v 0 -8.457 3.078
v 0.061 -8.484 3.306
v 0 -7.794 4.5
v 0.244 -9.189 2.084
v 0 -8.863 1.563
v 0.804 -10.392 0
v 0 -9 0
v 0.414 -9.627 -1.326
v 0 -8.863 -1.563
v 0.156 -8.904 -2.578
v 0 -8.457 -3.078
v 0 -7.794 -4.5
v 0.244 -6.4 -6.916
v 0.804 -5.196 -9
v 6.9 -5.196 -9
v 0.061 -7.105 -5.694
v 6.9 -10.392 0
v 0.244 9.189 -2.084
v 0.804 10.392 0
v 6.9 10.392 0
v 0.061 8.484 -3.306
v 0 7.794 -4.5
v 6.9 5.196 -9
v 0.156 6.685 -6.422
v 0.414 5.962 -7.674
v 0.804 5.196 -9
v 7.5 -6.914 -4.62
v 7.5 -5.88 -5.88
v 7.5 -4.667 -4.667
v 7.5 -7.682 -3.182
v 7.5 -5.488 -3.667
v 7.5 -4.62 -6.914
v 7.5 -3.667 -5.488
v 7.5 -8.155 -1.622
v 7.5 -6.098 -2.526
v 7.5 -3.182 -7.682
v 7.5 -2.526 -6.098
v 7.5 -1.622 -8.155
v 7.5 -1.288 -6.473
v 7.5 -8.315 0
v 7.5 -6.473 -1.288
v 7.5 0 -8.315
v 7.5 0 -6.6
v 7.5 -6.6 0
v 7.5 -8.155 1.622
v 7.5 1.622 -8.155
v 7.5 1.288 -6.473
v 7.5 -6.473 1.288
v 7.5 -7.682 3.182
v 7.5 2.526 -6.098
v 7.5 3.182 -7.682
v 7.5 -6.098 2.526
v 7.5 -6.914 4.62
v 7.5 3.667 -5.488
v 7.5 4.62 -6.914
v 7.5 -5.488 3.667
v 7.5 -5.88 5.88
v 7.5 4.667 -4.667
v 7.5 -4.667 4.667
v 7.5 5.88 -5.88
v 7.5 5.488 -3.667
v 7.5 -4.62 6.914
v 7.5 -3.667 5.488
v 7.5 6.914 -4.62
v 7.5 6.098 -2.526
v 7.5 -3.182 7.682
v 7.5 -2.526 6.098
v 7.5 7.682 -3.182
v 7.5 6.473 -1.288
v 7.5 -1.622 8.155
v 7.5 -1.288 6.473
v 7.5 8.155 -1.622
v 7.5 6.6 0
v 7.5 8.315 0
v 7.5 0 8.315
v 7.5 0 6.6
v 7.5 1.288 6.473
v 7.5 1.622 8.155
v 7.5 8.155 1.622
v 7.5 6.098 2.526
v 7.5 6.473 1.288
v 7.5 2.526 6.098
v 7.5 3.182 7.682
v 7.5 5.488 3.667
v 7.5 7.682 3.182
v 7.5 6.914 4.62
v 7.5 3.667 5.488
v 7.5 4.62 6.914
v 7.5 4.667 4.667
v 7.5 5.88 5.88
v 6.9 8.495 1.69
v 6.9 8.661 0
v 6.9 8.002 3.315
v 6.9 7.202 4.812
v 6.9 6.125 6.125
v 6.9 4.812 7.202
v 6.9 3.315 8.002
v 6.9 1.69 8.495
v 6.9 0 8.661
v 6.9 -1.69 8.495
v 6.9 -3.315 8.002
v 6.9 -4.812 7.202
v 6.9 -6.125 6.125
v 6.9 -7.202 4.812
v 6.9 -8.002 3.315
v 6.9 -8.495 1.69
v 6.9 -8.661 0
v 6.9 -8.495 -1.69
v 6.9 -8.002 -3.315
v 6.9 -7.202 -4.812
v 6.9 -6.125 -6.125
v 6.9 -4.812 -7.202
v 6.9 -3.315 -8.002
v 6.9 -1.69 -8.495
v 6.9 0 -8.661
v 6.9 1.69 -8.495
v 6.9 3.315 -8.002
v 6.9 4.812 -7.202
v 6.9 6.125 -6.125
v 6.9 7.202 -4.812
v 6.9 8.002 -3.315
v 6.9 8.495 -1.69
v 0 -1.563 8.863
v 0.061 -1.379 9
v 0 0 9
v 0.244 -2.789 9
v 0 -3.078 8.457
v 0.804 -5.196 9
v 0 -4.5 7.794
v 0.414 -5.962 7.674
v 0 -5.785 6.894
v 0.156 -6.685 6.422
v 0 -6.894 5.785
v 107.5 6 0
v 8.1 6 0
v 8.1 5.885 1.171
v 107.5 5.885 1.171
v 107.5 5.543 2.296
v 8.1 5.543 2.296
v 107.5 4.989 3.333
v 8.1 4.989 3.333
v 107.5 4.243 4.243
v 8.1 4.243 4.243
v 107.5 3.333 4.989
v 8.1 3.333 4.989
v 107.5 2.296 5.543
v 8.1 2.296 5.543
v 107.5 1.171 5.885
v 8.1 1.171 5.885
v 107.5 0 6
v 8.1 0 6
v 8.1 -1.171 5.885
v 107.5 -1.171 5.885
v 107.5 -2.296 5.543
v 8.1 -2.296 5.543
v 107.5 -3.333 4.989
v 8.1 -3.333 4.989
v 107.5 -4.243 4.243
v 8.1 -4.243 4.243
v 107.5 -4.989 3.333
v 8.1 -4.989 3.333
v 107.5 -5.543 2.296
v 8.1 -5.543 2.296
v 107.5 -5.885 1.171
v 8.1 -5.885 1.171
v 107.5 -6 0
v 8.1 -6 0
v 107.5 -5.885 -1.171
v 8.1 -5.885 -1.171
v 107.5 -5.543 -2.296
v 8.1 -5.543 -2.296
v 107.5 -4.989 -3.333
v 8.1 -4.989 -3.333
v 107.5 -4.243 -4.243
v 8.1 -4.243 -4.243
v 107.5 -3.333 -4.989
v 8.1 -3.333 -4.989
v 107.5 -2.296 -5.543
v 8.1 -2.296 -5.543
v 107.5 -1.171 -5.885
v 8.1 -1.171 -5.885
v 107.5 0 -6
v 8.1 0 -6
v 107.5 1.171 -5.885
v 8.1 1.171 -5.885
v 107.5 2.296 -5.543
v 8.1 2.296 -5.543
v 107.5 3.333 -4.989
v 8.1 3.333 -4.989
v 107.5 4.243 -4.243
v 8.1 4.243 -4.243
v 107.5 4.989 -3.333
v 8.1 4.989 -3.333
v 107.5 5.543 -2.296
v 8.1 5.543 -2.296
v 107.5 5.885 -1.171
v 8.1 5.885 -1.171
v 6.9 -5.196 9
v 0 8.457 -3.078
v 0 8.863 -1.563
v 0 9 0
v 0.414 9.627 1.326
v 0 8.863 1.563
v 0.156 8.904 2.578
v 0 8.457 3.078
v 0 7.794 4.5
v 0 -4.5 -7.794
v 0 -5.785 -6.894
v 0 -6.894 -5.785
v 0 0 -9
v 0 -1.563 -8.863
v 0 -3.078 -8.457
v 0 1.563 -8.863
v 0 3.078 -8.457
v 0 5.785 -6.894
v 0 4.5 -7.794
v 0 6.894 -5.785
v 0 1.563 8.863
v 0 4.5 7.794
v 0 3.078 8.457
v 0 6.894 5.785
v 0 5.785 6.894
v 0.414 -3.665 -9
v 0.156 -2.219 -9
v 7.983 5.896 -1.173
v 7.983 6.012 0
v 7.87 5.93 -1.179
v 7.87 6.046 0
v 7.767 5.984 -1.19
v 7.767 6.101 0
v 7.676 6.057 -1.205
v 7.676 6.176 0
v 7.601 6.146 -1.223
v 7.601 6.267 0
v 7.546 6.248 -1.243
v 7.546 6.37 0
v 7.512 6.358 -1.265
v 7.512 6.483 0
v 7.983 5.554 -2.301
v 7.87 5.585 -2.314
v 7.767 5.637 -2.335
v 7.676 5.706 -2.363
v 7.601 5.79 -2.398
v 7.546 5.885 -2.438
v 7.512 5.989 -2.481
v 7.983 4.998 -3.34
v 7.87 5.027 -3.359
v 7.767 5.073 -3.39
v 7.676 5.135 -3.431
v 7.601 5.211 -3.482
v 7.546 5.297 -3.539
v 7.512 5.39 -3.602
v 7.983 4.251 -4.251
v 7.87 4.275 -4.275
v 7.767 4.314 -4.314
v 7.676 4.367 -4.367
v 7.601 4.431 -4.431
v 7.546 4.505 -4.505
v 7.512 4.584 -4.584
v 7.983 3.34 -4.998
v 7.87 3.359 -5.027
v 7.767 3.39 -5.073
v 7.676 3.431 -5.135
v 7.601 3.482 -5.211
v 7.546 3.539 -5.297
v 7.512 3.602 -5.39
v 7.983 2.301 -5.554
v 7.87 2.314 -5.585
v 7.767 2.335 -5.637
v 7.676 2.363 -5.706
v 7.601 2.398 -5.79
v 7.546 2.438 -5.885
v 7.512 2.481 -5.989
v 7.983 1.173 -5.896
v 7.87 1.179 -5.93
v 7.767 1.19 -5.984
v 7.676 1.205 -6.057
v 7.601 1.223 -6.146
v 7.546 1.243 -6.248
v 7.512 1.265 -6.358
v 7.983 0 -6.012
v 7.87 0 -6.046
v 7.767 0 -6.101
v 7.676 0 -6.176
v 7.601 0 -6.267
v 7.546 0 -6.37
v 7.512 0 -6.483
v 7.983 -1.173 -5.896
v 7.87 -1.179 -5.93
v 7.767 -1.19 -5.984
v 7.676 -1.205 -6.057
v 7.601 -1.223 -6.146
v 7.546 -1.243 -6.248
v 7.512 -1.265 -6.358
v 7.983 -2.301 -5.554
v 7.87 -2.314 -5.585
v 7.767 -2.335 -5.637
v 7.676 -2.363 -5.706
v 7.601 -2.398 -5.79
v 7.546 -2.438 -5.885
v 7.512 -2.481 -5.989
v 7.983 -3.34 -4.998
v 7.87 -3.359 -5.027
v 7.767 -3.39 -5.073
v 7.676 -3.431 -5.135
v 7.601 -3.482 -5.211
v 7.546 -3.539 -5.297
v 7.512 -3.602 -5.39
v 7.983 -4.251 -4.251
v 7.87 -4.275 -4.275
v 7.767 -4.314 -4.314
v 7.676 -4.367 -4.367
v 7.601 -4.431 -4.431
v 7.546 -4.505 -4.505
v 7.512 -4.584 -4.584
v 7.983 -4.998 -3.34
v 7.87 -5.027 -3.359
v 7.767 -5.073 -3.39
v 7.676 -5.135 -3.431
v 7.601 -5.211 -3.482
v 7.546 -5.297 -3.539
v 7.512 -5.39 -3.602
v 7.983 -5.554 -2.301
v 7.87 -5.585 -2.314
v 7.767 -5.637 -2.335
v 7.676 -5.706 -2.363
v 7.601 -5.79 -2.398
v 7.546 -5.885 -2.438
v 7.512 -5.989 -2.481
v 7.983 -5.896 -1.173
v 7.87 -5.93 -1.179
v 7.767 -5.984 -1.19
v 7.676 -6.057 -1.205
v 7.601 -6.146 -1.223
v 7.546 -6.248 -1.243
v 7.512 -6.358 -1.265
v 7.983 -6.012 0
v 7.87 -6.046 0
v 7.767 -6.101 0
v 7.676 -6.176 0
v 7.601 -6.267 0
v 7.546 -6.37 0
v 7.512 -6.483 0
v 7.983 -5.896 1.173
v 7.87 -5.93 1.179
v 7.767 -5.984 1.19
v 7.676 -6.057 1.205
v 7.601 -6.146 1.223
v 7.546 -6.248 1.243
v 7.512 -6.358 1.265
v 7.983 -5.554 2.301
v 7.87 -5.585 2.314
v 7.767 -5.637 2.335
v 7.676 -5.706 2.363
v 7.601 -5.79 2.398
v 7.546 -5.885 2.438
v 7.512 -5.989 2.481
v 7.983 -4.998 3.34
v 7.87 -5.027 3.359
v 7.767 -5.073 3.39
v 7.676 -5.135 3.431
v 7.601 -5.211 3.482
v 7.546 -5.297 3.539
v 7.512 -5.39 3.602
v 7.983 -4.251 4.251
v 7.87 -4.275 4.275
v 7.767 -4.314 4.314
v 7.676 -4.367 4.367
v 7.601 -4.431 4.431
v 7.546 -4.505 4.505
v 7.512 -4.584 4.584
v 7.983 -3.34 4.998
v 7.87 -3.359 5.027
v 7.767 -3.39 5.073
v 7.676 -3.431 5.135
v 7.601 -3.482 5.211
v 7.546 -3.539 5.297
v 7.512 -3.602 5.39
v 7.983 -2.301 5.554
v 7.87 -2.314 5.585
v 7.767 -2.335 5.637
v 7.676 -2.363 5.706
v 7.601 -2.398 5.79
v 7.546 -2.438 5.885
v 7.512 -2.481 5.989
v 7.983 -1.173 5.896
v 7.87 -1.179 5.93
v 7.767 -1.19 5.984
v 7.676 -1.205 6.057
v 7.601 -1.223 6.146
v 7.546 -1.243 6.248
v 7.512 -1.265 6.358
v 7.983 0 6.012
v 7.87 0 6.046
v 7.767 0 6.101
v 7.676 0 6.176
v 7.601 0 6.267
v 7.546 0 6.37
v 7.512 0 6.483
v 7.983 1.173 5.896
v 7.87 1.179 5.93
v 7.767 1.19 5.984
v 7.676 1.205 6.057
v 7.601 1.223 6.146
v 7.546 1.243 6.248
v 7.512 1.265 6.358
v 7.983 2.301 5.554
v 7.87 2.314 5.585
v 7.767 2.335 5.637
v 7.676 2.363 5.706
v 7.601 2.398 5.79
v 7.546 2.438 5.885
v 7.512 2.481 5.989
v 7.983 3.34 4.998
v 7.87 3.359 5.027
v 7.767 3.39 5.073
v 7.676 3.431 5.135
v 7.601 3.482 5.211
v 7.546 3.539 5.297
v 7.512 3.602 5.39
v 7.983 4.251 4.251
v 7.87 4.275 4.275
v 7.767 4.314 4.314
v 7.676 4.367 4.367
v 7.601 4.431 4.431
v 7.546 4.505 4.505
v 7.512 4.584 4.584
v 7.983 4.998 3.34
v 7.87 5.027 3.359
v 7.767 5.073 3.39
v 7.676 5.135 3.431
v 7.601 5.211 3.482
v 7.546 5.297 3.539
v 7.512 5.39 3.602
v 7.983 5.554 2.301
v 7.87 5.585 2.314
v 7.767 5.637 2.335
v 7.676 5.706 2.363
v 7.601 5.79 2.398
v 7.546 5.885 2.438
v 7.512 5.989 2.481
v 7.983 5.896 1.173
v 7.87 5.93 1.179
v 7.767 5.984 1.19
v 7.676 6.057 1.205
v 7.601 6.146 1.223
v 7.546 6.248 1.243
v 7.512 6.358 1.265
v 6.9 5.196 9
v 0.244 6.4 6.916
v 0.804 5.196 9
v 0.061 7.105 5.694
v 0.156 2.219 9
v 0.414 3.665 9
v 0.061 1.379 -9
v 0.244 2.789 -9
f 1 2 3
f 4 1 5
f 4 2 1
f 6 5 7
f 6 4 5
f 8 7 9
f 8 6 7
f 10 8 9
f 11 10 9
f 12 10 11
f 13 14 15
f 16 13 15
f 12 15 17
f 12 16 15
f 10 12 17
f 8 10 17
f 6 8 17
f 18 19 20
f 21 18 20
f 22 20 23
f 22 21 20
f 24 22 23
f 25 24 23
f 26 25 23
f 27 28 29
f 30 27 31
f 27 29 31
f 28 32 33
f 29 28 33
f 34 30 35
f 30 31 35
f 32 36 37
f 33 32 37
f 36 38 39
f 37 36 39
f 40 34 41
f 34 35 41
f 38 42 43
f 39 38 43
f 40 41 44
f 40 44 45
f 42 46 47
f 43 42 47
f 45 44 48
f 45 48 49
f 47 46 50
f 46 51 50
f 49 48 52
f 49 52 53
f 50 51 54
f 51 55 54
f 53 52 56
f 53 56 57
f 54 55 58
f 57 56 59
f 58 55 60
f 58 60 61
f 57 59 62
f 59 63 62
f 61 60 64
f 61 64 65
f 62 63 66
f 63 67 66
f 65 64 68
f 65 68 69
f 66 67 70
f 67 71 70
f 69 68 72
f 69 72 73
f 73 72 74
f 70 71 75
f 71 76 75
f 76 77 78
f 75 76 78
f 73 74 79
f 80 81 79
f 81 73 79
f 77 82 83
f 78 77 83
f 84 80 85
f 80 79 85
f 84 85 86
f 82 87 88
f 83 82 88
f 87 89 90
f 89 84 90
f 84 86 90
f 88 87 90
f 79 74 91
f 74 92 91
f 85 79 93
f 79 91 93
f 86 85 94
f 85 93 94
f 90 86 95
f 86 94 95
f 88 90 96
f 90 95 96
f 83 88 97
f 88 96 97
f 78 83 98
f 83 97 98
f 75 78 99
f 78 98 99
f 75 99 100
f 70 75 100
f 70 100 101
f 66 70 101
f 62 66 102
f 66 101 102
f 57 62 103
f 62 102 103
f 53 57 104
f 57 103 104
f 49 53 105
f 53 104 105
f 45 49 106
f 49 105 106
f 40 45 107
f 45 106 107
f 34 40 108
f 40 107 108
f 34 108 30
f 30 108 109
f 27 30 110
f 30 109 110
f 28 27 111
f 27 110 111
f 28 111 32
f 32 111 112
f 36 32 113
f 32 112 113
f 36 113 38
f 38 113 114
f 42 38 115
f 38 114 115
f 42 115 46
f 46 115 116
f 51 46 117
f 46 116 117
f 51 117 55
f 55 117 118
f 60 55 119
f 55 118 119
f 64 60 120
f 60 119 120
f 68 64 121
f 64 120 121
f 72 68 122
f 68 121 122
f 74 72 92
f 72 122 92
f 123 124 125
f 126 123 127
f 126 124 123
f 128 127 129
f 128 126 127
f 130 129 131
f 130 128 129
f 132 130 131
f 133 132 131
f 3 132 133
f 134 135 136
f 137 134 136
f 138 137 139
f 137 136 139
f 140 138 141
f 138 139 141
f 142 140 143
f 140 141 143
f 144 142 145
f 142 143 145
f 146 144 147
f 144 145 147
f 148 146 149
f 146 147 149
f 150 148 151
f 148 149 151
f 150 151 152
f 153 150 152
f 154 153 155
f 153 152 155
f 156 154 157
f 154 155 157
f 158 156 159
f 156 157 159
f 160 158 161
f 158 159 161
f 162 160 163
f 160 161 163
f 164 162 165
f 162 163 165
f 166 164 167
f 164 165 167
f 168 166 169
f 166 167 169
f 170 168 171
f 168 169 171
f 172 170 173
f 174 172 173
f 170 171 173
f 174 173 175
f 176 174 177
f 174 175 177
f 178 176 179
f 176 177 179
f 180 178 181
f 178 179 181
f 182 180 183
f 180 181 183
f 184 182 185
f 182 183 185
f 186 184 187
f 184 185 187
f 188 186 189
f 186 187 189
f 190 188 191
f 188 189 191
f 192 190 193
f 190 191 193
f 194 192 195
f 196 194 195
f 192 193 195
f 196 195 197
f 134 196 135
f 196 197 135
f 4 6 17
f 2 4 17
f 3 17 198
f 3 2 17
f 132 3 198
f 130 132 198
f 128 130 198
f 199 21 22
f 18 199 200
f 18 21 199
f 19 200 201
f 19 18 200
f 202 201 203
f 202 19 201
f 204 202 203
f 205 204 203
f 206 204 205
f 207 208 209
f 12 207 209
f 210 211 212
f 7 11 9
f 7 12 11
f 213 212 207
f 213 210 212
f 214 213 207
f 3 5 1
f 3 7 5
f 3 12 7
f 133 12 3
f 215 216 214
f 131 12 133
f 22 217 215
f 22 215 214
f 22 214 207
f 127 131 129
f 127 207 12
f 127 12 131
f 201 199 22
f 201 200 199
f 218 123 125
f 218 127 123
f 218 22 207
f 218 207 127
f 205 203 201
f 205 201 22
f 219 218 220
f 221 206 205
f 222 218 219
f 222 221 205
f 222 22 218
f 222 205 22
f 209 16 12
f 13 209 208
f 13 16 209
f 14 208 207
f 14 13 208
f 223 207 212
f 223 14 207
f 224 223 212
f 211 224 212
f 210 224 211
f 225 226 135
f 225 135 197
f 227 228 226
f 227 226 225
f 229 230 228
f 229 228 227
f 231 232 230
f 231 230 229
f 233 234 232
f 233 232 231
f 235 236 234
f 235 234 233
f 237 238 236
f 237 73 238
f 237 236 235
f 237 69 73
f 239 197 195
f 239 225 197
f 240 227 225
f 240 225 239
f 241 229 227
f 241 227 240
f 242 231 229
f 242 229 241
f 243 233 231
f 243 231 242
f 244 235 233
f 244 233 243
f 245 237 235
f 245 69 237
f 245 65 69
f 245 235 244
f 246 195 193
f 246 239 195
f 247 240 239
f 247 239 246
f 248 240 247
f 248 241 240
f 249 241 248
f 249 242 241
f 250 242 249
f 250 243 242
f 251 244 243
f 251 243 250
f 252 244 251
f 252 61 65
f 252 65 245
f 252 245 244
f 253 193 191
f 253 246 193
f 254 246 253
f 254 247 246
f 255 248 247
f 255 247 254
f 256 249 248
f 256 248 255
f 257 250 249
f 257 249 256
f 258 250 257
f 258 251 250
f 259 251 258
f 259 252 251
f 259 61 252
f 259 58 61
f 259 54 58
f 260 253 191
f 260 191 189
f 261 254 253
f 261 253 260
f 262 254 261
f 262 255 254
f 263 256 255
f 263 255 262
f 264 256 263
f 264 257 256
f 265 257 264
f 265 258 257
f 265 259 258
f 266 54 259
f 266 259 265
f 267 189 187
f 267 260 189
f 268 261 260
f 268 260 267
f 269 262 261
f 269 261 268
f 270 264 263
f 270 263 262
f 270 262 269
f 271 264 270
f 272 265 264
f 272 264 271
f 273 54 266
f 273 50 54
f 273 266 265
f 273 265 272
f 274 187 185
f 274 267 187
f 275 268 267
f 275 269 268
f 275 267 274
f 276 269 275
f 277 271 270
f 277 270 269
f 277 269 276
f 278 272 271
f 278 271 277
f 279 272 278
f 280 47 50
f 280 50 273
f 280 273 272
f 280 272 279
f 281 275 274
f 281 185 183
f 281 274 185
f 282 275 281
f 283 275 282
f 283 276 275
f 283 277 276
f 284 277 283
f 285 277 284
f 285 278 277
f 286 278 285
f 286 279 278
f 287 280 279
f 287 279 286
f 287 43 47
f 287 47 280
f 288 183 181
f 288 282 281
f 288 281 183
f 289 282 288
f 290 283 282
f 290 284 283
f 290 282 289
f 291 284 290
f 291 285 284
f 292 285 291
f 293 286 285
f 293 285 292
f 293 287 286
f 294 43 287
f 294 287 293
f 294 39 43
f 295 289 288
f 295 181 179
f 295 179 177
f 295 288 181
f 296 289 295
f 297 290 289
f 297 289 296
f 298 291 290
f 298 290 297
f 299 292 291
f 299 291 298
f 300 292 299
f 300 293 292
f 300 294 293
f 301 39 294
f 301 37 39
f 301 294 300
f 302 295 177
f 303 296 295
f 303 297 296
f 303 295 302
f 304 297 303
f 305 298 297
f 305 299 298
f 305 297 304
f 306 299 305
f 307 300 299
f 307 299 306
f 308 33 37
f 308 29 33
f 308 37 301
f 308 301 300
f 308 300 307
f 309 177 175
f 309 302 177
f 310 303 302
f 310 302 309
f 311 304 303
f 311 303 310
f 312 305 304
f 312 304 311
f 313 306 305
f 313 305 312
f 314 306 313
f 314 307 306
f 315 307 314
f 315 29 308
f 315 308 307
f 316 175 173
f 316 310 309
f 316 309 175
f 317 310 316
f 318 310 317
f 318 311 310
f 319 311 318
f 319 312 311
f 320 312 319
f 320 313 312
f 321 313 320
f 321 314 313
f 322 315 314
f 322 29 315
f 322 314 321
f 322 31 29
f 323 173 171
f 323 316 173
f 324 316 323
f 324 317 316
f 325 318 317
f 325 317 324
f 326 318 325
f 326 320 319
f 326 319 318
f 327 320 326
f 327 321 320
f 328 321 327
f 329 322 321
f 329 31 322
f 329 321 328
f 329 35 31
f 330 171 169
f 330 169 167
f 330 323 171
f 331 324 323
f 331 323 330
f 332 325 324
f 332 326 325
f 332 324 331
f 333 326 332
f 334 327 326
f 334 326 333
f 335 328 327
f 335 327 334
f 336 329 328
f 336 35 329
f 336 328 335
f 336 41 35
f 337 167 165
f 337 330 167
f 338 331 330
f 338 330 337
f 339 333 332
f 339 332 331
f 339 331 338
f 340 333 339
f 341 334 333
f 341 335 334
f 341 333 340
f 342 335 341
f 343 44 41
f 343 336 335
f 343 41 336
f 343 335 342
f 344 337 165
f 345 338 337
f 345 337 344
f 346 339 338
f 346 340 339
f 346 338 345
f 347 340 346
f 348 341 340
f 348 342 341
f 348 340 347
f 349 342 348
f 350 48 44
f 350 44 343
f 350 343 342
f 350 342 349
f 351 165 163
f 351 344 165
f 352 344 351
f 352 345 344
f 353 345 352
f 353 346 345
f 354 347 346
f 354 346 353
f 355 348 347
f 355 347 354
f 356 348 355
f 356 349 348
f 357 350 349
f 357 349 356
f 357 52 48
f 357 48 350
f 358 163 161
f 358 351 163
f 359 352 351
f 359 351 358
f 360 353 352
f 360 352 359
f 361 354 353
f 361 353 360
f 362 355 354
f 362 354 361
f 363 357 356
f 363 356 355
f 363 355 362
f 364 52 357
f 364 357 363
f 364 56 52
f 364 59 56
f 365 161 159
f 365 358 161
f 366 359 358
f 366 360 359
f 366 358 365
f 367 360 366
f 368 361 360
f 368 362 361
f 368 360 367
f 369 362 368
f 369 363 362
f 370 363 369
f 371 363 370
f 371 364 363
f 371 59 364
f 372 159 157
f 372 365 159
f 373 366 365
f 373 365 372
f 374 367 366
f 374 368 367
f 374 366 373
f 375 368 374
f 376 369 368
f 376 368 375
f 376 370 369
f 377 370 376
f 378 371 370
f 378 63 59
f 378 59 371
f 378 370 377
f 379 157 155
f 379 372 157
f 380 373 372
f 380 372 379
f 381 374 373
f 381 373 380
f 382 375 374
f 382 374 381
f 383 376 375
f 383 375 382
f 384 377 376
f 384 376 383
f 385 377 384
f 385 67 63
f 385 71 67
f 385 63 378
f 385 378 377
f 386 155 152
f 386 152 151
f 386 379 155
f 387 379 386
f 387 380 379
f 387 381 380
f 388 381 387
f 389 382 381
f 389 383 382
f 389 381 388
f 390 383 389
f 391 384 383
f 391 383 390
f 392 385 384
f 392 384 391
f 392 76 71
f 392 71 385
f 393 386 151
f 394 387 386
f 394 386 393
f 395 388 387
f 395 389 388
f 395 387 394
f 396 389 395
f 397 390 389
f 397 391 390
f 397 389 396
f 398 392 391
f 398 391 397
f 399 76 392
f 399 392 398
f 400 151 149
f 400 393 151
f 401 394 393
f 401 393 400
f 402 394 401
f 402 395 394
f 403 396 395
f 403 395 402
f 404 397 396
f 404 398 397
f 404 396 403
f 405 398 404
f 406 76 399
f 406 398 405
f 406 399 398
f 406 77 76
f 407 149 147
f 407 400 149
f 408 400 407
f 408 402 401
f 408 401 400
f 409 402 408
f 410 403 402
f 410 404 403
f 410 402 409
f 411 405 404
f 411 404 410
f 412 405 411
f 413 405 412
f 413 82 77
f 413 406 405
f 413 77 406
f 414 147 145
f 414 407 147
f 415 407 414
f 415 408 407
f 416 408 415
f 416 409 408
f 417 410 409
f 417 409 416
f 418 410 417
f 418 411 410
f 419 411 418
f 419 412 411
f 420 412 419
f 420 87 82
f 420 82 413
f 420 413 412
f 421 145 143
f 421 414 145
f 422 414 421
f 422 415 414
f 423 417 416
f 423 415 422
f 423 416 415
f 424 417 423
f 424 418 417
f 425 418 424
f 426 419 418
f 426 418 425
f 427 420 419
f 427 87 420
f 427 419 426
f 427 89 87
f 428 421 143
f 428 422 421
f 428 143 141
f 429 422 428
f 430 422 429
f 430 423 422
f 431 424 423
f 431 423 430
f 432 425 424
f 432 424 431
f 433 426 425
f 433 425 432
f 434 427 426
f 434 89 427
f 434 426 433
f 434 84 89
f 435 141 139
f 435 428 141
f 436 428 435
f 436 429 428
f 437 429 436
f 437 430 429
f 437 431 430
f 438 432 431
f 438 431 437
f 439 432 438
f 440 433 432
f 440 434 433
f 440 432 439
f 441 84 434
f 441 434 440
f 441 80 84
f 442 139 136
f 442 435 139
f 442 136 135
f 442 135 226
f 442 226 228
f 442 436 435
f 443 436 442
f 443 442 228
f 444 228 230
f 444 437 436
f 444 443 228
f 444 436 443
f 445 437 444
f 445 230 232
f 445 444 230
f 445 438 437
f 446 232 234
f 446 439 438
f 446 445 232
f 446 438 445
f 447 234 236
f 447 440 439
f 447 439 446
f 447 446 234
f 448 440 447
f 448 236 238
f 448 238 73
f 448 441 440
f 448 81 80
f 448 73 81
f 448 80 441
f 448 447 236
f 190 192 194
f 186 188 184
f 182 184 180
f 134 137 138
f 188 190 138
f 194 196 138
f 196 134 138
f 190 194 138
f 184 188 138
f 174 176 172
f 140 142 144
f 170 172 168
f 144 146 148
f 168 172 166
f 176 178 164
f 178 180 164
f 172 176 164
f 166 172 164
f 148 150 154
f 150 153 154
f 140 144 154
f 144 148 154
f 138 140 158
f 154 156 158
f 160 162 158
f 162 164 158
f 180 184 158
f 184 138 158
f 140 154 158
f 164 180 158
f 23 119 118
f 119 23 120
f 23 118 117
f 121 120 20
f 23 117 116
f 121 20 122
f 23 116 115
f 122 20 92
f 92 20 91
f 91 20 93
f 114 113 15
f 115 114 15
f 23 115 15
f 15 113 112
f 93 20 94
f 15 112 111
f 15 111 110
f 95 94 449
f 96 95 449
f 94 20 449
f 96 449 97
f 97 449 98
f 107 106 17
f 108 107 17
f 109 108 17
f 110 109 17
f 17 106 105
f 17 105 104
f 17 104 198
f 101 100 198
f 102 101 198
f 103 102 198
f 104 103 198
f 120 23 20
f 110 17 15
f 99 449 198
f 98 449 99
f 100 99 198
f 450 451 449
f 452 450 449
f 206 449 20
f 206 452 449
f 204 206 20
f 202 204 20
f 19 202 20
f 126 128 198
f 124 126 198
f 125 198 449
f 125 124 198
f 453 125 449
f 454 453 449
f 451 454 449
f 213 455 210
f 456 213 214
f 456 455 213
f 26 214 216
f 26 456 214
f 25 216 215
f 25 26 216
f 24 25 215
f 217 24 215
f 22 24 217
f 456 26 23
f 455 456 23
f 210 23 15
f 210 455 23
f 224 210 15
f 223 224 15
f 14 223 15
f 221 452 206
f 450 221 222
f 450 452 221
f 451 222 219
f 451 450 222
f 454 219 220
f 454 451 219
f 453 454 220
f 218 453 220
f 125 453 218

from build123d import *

# Parameters (mm, degrees)
EXTRUDE_382_DEPTH = 7.5
FILLET_1274_R     = 0.6


with BuildPart() as part:
    # 草图1 → Extrude 382 (new body)
    with BuildSketch(Plane(origin=(0, 0, 0), x_dir=(0, 0, -1), z_dir=(1, 0, 0))):
        Polygon((9, 5.196152423), (9, -5.196152423), (0, -10.392304845), (-9, -5.196152423), (-9, 5.196152423), (0, 10.392304845), align=None)
    extrude(amount=EXTRUDE_382_DEPTH)

    # 草图2 → 凸台-旋转1 (revolve)
    with BuildSketch(Plane.XY):
        Polygon((0, 0), (107.5, 0), (107.5, 4.4845), (107.5, 6), (77.5, 6), (0, 6), align=None)
    revolve(axis=Axis((0, 0, 0), (1, 0, 0)))

    # 草图3 → 切除-旋转1 (revolve, cut)
    with BuildSketch(Plane.XY):
        Polygon((0, 9), (3.690598923, 15.392304845), (3.690598923, 20.392304845), (-10, 20.392304845), (-10, 9), align=None)
    revolve(axis=Axis((0, 0, 0), (1, 0, 0)), mode=Mode.SUBTRACT)

    # 草图4 → 切除-旋转3 (revolve, cut)
    with BuildSketch(Plane.XY):
        Polygon((7.5, 8.315), (6.9, 8.661410162), (6.9, 10.392304845), (7.5, 10.392304845), align=None)
    revolve(axis=Axis((0, 0, 0), (1, 0, 0)), mode=Mode.SUBTRACT)

    # Fillet 1274
    fillet_1274_edges = [part.edges().sort_by_distance(p)[0] for p in [
        (7.5, -6, 0),
    ]]
    fillet(fillet_1274_edges, radius=FILLET_1274_R)


solid = part.part
